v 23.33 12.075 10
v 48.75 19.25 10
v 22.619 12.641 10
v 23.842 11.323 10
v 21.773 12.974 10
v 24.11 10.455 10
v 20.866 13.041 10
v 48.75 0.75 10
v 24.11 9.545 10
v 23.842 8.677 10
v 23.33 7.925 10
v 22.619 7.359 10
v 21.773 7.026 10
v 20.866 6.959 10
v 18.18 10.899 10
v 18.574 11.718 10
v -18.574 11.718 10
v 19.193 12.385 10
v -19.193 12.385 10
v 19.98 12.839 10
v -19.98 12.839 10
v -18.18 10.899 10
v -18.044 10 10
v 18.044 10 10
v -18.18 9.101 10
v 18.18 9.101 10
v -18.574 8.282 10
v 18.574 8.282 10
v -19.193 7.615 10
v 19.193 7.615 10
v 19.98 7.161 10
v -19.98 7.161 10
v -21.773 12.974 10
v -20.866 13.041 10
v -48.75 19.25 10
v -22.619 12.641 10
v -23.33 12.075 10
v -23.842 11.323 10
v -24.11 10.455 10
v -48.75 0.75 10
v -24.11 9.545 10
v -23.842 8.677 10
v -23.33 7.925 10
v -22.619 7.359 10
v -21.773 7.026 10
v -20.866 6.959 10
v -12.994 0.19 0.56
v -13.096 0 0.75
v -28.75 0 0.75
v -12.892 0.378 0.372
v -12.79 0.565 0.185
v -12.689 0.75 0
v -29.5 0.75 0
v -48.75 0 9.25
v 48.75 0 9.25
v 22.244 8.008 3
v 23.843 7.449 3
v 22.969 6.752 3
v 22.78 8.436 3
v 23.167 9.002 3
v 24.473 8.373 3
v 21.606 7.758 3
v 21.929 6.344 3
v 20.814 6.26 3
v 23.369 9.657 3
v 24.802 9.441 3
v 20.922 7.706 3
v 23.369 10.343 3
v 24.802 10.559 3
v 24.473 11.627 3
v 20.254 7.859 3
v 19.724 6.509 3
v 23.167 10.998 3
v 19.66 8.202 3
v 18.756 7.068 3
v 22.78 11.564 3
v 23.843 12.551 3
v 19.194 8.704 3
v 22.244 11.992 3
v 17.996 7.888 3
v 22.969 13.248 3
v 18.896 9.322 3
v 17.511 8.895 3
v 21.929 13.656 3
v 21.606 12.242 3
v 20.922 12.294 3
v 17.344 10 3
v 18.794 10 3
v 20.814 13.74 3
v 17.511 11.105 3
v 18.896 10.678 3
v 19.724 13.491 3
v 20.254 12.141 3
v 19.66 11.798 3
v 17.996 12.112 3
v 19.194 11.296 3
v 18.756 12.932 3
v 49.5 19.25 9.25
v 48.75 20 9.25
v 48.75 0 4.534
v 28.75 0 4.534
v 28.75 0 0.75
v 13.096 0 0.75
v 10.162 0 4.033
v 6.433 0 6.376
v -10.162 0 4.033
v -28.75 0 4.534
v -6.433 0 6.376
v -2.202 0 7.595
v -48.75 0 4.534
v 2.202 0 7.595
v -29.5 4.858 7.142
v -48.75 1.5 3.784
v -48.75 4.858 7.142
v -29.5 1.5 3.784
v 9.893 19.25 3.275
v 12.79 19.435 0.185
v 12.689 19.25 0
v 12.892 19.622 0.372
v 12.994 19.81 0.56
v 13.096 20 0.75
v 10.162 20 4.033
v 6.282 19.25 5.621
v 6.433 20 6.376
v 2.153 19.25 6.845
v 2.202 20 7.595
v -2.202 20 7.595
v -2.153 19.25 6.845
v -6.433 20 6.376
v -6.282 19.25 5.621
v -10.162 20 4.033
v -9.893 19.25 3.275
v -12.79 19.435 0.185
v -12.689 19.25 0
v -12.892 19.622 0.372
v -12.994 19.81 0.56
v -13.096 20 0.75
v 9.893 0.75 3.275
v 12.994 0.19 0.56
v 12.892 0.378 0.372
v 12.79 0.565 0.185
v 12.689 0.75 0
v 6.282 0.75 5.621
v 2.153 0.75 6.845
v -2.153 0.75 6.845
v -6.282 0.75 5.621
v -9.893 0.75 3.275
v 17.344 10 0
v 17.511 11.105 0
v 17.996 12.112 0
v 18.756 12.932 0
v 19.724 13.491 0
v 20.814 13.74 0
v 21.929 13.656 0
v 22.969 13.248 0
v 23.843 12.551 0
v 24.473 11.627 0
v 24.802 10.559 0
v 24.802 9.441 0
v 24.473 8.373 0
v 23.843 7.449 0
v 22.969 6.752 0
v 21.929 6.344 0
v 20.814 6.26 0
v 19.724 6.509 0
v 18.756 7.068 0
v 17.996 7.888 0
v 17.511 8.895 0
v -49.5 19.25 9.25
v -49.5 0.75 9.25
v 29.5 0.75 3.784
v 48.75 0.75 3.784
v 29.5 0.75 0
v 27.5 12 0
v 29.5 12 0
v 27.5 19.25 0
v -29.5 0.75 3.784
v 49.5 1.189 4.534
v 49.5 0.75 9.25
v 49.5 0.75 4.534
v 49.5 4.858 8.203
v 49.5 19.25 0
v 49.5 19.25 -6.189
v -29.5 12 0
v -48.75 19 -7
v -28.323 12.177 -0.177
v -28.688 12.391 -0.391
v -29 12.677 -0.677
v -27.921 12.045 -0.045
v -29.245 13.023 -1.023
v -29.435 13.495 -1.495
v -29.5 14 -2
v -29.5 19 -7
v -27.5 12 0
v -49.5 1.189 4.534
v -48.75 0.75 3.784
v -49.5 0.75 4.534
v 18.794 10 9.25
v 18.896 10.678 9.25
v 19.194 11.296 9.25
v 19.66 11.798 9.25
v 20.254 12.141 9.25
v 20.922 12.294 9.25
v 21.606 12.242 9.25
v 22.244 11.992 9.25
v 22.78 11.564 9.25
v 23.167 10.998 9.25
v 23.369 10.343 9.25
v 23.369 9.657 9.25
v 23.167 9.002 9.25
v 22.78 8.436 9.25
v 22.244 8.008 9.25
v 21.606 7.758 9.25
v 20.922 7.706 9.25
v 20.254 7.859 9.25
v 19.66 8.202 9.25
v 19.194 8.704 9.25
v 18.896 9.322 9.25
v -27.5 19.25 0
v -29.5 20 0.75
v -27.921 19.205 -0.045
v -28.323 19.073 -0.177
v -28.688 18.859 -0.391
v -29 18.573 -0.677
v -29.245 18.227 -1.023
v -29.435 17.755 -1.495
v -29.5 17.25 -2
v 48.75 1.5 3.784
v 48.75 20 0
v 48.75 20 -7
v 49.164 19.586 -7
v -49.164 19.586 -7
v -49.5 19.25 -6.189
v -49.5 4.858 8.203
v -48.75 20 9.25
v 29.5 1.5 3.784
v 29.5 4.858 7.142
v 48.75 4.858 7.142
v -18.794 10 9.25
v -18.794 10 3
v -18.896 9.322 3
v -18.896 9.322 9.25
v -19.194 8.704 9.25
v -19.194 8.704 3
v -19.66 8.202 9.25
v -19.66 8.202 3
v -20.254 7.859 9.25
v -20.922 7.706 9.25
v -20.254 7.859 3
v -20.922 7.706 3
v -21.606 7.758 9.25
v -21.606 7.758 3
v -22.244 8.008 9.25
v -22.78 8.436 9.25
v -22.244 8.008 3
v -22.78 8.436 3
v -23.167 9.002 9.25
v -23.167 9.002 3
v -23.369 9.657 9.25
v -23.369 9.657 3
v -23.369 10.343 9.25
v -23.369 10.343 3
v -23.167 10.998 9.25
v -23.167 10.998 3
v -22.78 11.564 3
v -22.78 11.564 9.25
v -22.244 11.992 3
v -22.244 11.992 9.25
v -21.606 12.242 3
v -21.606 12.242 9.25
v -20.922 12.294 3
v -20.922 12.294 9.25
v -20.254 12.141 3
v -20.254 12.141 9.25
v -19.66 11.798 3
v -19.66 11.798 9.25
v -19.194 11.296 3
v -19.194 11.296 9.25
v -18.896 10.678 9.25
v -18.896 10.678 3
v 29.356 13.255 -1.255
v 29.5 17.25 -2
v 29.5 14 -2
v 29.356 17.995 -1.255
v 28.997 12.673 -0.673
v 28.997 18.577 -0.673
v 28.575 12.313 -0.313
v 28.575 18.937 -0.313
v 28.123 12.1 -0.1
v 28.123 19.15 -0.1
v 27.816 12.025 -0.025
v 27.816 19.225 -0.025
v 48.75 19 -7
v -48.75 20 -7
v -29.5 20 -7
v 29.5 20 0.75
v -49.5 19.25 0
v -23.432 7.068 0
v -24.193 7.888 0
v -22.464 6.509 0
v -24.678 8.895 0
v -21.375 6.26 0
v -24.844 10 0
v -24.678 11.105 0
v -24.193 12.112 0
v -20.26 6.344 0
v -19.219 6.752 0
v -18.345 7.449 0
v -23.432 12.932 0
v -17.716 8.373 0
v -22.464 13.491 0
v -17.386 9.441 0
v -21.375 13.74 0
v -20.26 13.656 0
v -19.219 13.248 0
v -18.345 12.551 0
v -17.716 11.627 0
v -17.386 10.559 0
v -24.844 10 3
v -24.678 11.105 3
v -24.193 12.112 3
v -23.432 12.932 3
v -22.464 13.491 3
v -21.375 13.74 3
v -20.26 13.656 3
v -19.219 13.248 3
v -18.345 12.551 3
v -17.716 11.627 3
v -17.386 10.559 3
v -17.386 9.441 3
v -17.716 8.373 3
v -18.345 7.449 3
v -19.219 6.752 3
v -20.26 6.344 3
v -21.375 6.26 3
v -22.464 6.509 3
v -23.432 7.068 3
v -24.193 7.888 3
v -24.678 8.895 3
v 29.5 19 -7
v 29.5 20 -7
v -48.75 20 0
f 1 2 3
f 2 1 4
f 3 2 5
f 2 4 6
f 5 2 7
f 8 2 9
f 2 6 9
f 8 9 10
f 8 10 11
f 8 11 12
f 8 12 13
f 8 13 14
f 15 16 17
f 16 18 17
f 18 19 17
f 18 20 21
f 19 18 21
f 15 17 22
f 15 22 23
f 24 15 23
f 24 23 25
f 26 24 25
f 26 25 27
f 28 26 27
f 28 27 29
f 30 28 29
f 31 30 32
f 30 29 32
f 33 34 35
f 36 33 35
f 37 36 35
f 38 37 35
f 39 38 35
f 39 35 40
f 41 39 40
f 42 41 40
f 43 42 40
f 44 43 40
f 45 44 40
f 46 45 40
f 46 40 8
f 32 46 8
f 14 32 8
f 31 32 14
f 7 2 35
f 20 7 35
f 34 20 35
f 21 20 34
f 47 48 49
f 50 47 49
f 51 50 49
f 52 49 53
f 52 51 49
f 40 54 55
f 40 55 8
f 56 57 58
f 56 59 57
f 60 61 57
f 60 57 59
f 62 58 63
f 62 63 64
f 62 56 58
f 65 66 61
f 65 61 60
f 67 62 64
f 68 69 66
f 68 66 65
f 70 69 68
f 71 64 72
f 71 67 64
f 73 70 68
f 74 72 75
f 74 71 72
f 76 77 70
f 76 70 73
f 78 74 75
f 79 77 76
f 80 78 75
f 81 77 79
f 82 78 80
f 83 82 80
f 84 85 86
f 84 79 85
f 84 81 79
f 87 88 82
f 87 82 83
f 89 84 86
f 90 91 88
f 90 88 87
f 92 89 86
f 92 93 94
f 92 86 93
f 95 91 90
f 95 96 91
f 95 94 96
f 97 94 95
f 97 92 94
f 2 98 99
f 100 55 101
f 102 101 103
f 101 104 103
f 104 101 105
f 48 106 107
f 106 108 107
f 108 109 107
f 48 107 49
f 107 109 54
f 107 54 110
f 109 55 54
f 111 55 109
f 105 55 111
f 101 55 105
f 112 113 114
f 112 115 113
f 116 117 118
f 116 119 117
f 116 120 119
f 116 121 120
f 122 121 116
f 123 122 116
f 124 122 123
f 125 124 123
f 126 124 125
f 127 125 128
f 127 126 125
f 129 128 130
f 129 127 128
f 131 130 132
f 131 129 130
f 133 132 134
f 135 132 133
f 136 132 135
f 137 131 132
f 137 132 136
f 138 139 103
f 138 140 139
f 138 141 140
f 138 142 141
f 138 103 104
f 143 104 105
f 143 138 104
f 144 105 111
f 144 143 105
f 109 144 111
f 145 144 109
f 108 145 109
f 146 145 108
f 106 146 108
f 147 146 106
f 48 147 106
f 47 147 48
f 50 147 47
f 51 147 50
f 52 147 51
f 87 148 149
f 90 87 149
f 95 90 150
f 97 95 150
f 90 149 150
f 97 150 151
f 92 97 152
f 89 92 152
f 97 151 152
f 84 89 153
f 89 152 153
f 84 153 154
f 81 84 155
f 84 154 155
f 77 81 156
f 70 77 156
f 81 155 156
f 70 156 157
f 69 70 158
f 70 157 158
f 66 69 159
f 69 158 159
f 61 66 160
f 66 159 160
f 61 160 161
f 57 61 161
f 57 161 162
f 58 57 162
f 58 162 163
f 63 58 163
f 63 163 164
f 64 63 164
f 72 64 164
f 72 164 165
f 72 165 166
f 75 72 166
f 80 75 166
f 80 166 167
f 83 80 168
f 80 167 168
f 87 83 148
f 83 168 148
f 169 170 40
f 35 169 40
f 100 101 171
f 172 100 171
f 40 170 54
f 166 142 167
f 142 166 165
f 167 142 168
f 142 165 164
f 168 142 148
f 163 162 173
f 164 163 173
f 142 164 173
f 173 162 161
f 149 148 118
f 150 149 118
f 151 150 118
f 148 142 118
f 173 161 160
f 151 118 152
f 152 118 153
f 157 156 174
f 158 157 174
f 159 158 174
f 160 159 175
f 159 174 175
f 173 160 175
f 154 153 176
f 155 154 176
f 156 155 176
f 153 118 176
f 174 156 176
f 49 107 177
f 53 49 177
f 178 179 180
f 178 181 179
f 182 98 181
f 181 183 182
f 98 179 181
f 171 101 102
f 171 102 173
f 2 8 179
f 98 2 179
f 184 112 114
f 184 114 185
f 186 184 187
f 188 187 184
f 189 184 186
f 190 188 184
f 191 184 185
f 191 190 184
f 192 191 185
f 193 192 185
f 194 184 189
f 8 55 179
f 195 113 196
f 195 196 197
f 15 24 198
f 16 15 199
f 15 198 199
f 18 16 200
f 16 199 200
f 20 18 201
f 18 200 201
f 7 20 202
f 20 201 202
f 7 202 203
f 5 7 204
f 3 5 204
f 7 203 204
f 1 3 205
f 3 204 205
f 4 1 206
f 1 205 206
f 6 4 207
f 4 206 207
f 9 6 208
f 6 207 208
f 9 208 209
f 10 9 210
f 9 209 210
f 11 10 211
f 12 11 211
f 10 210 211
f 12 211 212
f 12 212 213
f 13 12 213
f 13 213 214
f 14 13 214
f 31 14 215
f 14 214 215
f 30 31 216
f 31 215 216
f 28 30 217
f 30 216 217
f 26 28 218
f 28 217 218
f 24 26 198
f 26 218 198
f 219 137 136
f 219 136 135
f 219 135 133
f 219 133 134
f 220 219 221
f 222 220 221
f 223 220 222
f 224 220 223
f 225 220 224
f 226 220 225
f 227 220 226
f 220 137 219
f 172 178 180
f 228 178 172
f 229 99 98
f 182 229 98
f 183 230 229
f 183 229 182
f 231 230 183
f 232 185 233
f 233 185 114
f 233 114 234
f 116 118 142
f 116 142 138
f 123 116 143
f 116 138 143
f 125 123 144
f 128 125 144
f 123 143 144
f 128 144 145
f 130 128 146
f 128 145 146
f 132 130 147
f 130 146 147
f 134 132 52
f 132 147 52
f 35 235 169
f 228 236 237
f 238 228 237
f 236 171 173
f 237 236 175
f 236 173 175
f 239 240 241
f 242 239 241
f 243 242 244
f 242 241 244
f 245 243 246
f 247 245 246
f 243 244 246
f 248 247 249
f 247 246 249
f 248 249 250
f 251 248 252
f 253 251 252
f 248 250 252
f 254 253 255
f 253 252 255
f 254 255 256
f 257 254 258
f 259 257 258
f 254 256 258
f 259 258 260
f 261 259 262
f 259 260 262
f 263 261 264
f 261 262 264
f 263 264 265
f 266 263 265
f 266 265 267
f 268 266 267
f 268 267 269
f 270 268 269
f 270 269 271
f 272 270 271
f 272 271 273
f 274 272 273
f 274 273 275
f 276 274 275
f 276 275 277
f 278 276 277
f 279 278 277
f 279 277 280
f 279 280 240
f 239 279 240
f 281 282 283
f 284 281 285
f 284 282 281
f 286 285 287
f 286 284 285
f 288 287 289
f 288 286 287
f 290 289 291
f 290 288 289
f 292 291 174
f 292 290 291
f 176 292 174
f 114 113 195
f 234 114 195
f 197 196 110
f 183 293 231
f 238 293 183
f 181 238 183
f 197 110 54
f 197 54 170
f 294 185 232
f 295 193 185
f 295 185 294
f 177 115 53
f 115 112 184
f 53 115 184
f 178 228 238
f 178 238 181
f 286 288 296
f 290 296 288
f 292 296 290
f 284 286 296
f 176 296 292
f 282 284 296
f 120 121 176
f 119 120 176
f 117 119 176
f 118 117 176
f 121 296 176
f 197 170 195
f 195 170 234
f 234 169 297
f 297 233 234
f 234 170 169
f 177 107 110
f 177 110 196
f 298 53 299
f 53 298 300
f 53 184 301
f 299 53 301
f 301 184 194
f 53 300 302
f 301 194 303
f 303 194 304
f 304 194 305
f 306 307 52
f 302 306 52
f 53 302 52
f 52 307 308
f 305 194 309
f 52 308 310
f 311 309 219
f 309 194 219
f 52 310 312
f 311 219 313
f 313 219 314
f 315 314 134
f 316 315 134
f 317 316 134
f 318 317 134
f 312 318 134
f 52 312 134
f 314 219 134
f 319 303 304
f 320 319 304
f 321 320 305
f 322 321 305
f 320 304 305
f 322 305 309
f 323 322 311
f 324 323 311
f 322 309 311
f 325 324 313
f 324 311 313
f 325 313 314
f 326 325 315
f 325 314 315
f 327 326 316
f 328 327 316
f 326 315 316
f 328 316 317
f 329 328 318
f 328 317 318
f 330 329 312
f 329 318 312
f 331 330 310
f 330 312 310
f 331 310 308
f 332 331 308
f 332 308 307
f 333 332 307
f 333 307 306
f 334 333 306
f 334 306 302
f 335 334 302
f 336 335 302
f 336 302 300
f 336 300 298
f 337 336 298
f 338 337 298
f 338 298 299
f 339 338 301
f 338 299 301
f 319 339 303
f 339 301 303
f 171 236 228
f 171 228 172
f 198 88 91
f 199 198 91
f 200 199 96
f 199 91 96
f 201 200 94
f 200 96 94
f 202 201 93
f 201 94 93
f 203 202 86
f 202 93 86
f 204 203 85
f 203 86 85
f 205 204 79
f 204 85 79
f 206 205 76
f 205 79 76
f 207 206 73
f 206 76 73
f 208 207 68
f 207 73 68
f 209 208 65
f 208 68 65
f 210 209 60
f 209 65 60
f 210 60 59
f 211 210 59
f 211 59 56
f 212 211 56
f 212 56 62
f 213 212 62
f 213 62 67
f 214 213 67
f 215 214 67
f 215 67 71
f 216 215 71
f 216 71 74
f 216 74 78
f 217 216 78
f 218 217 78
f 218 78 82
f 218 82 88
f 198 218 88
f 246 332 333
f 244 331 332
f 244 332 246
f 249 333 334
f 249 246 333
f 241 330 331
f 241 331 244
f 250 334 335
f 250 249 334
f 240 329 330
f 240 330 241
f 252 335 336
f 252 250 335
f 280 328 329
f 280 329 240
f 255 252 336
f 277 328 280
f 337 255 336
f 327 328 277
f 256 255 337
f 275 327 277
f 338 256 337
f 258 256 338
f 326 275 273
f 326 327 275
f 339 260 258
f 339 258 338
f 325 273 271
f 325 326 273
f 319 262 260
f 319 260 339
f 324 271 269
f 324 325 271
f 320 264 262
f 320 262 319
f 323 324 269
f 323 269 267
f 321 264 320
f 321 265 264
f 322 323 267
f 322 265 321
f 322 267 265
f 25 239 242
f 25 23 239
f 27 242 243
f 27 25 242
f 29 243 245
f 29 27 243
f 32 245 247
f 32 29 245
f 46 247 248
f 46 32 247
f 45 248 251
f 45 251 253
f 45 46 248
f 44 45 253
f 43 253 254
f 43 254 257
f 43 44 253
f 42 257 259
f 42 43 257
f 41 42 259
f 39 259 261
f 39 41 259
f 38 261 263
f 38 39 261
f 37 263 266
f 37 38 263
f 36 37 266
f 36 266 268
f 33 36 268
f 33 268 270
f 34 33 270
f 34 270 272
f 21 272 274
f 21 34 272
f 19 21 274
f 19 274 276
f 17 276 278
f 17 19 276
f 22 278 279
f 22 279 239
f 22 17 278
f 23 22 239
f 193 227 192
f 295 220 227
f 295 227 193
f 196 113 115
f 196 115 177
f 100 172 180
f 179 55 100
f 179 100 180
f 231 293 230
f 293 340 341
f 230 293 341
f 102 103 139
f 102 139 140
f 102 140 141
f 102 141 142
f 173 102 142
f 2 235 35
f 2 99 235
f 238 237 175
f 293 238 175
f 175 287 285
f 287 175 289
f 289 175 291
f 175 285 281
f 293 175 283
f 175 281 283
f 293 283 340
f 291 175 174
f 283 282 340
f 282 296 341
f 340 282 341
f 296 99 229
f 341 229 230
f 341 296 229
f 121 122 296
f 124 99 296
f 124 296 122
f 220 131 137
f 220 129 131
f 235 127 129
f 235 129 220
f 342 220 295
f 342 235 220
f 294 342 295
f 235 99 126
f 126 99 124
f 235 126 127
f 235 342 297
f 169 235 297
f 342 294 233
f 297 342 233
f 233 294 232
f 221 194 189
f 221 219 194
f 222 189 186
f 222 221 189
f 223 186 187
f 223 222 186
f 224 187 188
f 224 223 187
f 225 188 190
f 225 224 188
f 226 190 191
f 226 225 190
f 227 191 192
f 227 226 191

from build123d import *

# Parameters (mm, degrees)
SKIZZE1_W                       = 59
SKIZZE1_H                       = 20
AUFSATZ_LINEAR_AUSTRAGEN1_DEPTH = 10
AUFSATZ_LINEAR_AUSTRAGEN2_DEPTH = 20
SKIZZE3_R                       = 15
SCHNITT_LINEAR_AUSTRAGEN1_DEPTH = 20
SKIZZE4_R                       = 2.3
SCHNITT_LINEAR_AUSTRAGEN2_DEPTH = 10
SKIZZE5_R                       = 3.75
SCHNITT_LINEAR_AUSTRAGEN3_DEPTH = 3
SCHNITT_LINEAR_AUSTRAGEN4_DEPTH = 20
VERRUNDUNG1_R                   = 2


with BuildPart() as part:
    # Skizze1 → Aufsatz-Linear austragen1 (new body)
    with BuildSketch(Plane.XY):
        with Locations((0, 10)):
            Rectangle(SKIZZE1_W, SKIZZE1_H)
    extrude(amount=AUFSATZ_LINEAR_AUSTRAGEN1_DEPTH)

    # Skizze2 → Aufsatz-Linear austragen2 (add)
    with BuildSketch(Plane.ZY.offset(29.5)):
        Polygon((7.142135624, 4.857864376), (-7, 19), (-7, 20), (0, 20), (10, 20), (10, 0), (2.284271247, 0), align=None)
    aufsatz_linear_austragen2 = extrude(amount=AUFSATZ_LINEAR_AUSTRAGEN2_DEPTH)

    # Spiegeln1: Aufsatz-Linear austragen2 across plane
    add(aufsatz_linear_austragen2.mirror(Plane(origin=(0, 0, 0), x_dir=(0, 0, 1), z_dir=(1, 0, 0))))

    # Skizze3 → Schnitt-Linear austragen1 (cut)
    with BuildSketch(Plane.XZ):
        with Locations((0, -8)):
            Circle(SKIZZE3_R)
    extrude(amount=-SCHNITT_LINEAR_AUSTRAGEN1_DEPTH, mode=Mode.SUBTRACT)

    # Skizze4 → Schnitt-Linear austragen2 (cut)
    with BuildSketch(Plane(origin=(0, 0, 0), x_dir=(-1, 0, 0), z_dir=(0, 0, -1))):
        with Locations((-21.09428877, 10)):
            Circle(SKIZZE4_R)
        with Locations(Location((21.09428877, 10, 0), (0, 0, 180))):
            Circle(SKIZZE4_R)
    extrude(amount=-SCHNITT_LINEAR_AUSTRAGEN2_DEPTH, mode=Mode.SUBTRACT)

    # Skizze5 → Schnitt-Linear austragen3 (cut)
    with BuildSketch(Plane(origin=(0, 0, 0), x_dir=(-1, 0, 0), z_dir=(0, 0, -1))):
        with Locations((-21.09428877, 10)):
            Circle(SKIZZE5_R)
        with Locations((21.09428877, 10)):
            Circle(SKIZZE5_R)
    extrude(amount=-SCHNITT_LINEAR_AUSTRAGEN3_DEPTH, mode=Mode.SUBTRACT)

    # Skizze6 → Schnitt-Linear austragen4 (cut)
    with BuildSketch(Plane(origin=(49.5, 0, 0), x_dir=(0, 0, -1), z_dir=(1, 0, 0))):
        Polygon((-3.784271247, 1.5), (-3.784271247, 0), (-1.831080062, -0.949282867), (-1.396270995, 1.527811212), align=None)
    schnitt_linear_austragen4 = extrude(amount=-SCHNITT_LINEAR_AUSTRAGEN4_DEPTH, mode=Mode.SUBTRACT)

    # Spiegeln2: Schnitt-Linear austragen4 across plane
    add(schnitt_linear_austragen4.mirror(Plane(origin=(0, 0, 0), x_dir=(0, 0, 1), z_dir=(1, 0, 0))), mode=Mode.SUBTRACT)

    # Fase1
    # the kernel refuses this chamfer: 0.75 mm, written as the material it takes off along each edge
    with BuildSketch(Plane(origin=(49, 19.5, 9.5), x_dir=(-0.7071067811865492, 0.7071067811865459, 0), z_dir=(0.5773502691896248, 0.5773502691896276, 0.5773502691896248)), Plane(origin=(-49, 19.5, 9.5), x_dir=(-0.7071067811865492, -0.7071067811865459, 0), z_dir=(-0.5773502691896248, 0.5773502691896276, 0.5773502691896248))) as fase1_piece_1:
        Polygon((-0.530330086, -0.306186218), (0.530330086, -0.306186218), (0, 0.612372436), align=None)
    extrude(amount=0.952627944, mode=Mode.SUBTRACT)
    with BuildSketch(Plane(origin=(49, 0.5, 4.284271247), x_dir=(-0.7071067811865476, -1.4654196281048569e-15, -0.7071067811865476), z_dir=(0.5773502691896273, -0.5773502691896242, -0.577350269189626)), Plane(origin=(-49, 0.5, 9.5), x_dir=(-0.7071067811865458, 0.7071067811865491, 0), z_dir=(-0.5773502691896266, -0.577350269189624, 0.5773502691896268)), Plane(origin=(-49, 0.5, 4.284271247), x_dir=(0, 0.7071067811865487, -0.7071067811865464), z_dir=(-0.577350269189627, -0.5773502691896243, -0.5773502691896261)), Plane(origin=(49, 0.5, 9.5), x_dir=(-0.7071067811865457, -0.7071067811865492, 0), z_dir=(0.5773502691896267, -0.5773502691896237, 0.5773502691896267))) as fase1_piece_2:
        Polygon((-0.530330086, 0.306186218), (0.530330086, 0.306186218), (0, -0.612372436), align=None)
    extrude(amount=0.952627944, mode=Mode.SUBTRACT)
    with BuildSketch(Plane(origin=(-21.09428877, 10, 10), x_dir=(1, 0, 0), z_dir=(0, 1, 0))) as fase1_piece_3:
        with BuildLine():
            Line((2.278786797, 0.771213203), (3.071213203, -0.021213203))
            Line((3.071213203, -0.021213203), (3.071213203, -0.036213203))
            ThreePointArc((3.071213203, -0.036213203), (2.685606602, -0.015), (2.3, -0.015))
            Line((2.3, -0.015), (2.285, 0))
            ThreePointArc((2.285, 0), (2.285, 0.385606602), (2.263786797, 0.771213203))
            Line((2.263786797, 0.771213203), (2.278786797, 0.771213203))
        make_face()
    revolve(axis=Axis((-21.09428877, 10, 10), (0, 0, -1)), mode=Mode.SUBTRACT)
    with BuildSketch(Plane(origin=(21.09428877, 10, 10), x_dir=(-1, 0, 0), z_dir=(0, -1, 0))) as fase1_piece_4:
        with BuildLine():
            Line((3.071213203, -0.021213203), (2.278786797, 0.771213203))
            Line((2.278786797, 0.771213203), (2.263786797, 0.771213203))
            ThreePointArc((2.263786797, 0.771213203), (2.285, 0.385606602), (2.285, 0))
            Line((2.285, 0), (2.3, -0.015))
            ThreePointArc((2.3, -0.015), (2.685606602, -0.015), (3.071213203, -0.036213203))
            Line((3.071213203, -0.036213203), (3.071213203, -0.021213203))
        make_face()
    revolve(axis=Axis((21.09428877, 10, 10), (0, 0, -1)), mode=Mode.SUBTRACT)
    with BuildSketch(Plane(origin=(49.5, 20, 0), x_dir=(-0.9996219169112969, 0.027495876610582292, 0), z_dir=(0, 0, 1))) as fase1_piece_5:
        with BuildLine():
            Line((0.771504896, 0), (-0.042410366, 0.770338345))
            Line((-0.042410366, 0.770338345), (-0.057404695, 0.769925907))
            ThreePointArc((-0.057404695, 0.769925907), (-0.02559692, 0.385048372), (-0.014994329, -0.000412438))
            Line((-0.014994329, -0.000412438), (0.000412438, -0.014994329))
            ThreePointArc((0.000412438, -0.014994329), (0.385873249, -0.004391737), (0.771917335, -0.014994329))
            Line((0.771917335, -0.014994329), (0.771504896, 0))
        make_face()
    extrude(amount=11.928762241, mode=Mode.SUBTRACT)
    with BuildSketch(Plane(origin=(49.5, 4.857864376, 7.142135624), x_dir=(-0.9996219169112968, -0.01944252080601377, -0.01944252080601398), z_dir=(0, 0.7071067811865513, -0.7071067811865438)), Plane(origin=(51.428762241, 0, 3.784271247), x_dir=(0, -0.027495876610586376, 0.9996219169112968), z_dir=(-1, 0, 0))) as fase1_piece_6:
        with BuildLine():
            Line((0.771504896, 0), (-0.042410366, 0.770338345))
            Line((-0.042410366, 0.770338345), (-0.057404695, 0.769925907))
            ThreePointArc((-0.057404695, 0.769925907), (-0.02559692, 0.385048372), (-0.014994329, -0.000412438))
            Line((-0.014994329, -0.000412438), (0.000412438, -0.014994329))
            ThreePointArc((0.000412438, -0.014994329), (0.385873249, -0.004391737), (0.771917335, -0.014994329))
            Line((0.771917335, -0.014994329), (0.771504896, 0))
        make_face()
    extrude(amount=21.928762241, mode=Mode.SUBTRACT)
    with BuildSketch(Plane(origin=(49.5, 0.13615914, 2.420430388), x_dir=(-0.9996219169112968, 0.01944252080601445, -0.019442520806014447), z_dir=(0, 0.7071067811865475, 0.7071067811865476))) as fase1_piece_7:
        with BuildLine():
            Line((0.771504896, 0), (-0.042410366, 0.770338345))
            Line((-0.042410366, 0.770338345), (-0.057404695, 0.769925907))
            ThreePointArc((-0.057404695, 0.769925907), (-0.02559692, 0.385048372), (-0.014994329, -0.000412438))
            Line((-0.014994329, -0.000412438), (0.000412438, -0.014994329))
            ThreePointArc((0.000412438, -0.014994329), (0.385873249, -0.004391737), (0.771917335, -0.014994329))
            Line((0.771917335, -0.014994329), (0.771504896, 0))
        make_face()
    extrude(amount=6.677499583, mode=Mode.SUBTRACT)
    with BuildSketch(Plane(origin=(49.5, 3.428762241, 3.784271247), x_dir=(0.027495876610582164, 0, 0.9996219169112969), z_dir=(0, -1, 0)), Plane(origin=(-49.5, 3.428762241, 3.784271247), x_dir=(0.9996219169112968, 0, -0.027495876610586317), z_dir=(0, -1, 0))) as fase1_piece_8:
        with BuildLine():
            Line((0.771504896, 0), (-0.042410366, 0.770338345))
            Line((-0.042410366, 0.770338345), (-0.057404695, 0.769925907))
            ThreePointArc((-0.057404695, 0.769925907), (-0.02559692, 0.385048372), (-0.014994329, -0.000412438))
            Line((-0.014994329, -0.000412438), (0.000412438, -0.014994329))
            ThreePointArc((0.000412438, -0.014994329), (0.385873249, -0.004391737), (0.771917335, -0.014994329))
            Line((0.771917335, -0.014994329), (0.771504896, 0))
        make_face()
    extrude(amount=5.357524482, mode=Mode.SUBTRACT)
    with BuildSketch(Plane(origin=(-49.5, 0, 11.928762241), x_dir=(0.9996219169112968, -0.027495876610586487, 0), z_dir=(0, 0, -1))) as fase1_piece_9:
        with BuildLine():
            Line((0.771504896, 0), (-0.042410366, -0.770338345))
            Line((-0.042410366, -0.770338345), (-0.057404695, -0.769925907))
            ThreePointArc((-0.057404695, -0.769925907), (-0.02559692, -0.385048372), (-0.014994329, 0.000412438))
            Line((-0.014994329, 0.000412438), (0.000412438, 0.014994329))
            ThreePointArc((0.000412438, 0.014994329), (0.385873249, 0.004391737), (0.771917335, 0.014994329))
            Line((0.771917335, 0.014994329), (0.771504896, 0))
        make_face()
    extrude(amount=10.073253234, mode=Mode.SUBTRACT)
    with BuildSketch(Plane(origin=(49.5, 21.928762241, 10), x_dir=(-0.9996219169112968, 0, 0.027495876610586893), z_dir=(0, -1, 0)), Plane(origin=(-49.5, 21.928762241, 10), x_dir=(-0.027495876610582164, 0, -0.9996219169112969), z_dir=(0, -1, 0))) as fase1_piece_10:
        with BuildLine():
            Line((0.771504896, 0), (-0.042410366, 0.770338345))
            Line((-0.042410366, 0.770338345), (-0.057404695, 0.769925907))
            ThreePointArc((-0.057404695, 0.769925907), (-0.02559692, 0.385048372), (-0.014994329, -0.000412438))
            Line((-0.014994329, -0.000412438), (0.000412438, -0.014994329))
            ThreePointArc((0.000412438, -0.014994329), (0.385873249, -0.004391737), (0.771917335, -0.014994329))
            Line((0.771917335, -0.014994329), (0.771504896, 0))
        make_face()
    extrude(amount=23.857524482, mode=Mode.SUBTRACT)
    with BuildSketch(Plane(origin=(51.428762241, 20, 10), x_dir=(0, 0.027495876610586768, -0.9996219169112968), z_dir=(-1, 0, 0))) as fase1_piece_11:
        with BuildLine():
            Line((0.771504896, 0), (-0.042410366, 0.770338345))
            Line((-0.042410366, 0.770338345), (-0.057404695, 0.769925907))
            ThreePointArc((-0.057404695, 0.769925907), (-0.02559692, 0.385048372), (-0.014994329, -0.000412438))
            Line((-0.014994329, -0.000412438), (0.000412438, -0.014994329))
            ThreePointArc((0.000412438, -0.014994329), (0.385873249, -0.004391737), (0.771917335, -0.014994329))
            Line((0.771917335, -0.014994329), (0.771504896, 0))
        make_face()
    extrude(amount=102.857524482, mode=Mode.SUBTRACT)
    with BuildSketch(Plane(origin=(51.428762241, 0, 10), x_dir=(0, -0.02749587661058636, -0.9996219169112968), z_dir=(-1, 0, 0))) as fase1_piece_12:
        with BuildLine():
            Line((0.771504896, 0), (-0.042410366, -0.770338345))
            Line((-0.042410366, -0.770338345), (-0.057404695, -0.769925907))
            ThreePointArc((-0.057404695, -0.769925907), (-0.02559692, -0.385048372), (-0.014994329, 0.000412438))
            Line((-0.014994329, 0.000412438), (0.000412438, 0.014994329))
            ThreePointArc((0.000412438, 0.014994329), (0.385873249, 0.004391737), (0.771917335, 0.014994329))
            Line((0.771917335, 0.014994329), (0.771504896, 0))
        make_face()
    extrude(amount=102.857524482, mode=Mode.SUBTRACT)
    with BuildSketch(Plane(origin=(49.5, 0, 11.928762241), x_dir=(-0.9996219169112968, -0.027495876610586487, 0), z_dir=(0, 0, -1))) as fase1_piece_13:
        with BuildLine():
            Line((0.771504896, 0), (-0.042410366, 0.770338345))
            Line((-0.042410366, 0.770338345), (-0.057404695, 0.769925907))
            ThreePointArc((-0.057404695, 0.769925907), (-0.02559692, 0.385048372), (-0.014994329, -0.000412438))
            Line((-0.014994329, -0.000412438), (0.000412438, -0.014994329))
            ThreePointArc((0.000412438, -0.014994329), (0.385873249, -0.004391737), (0.771917335, -0.014994329))
            Line((0.771917335, -0.014994329), (0.771504896, 0))
        make_face()
    extrude(amount=10.073253234, mode=Mode.SUBTRACT)
    with BuildSketch(Plane(origin=(29.5, 0, -1.928762241), x_dir=(-0.9996219169112968, -0.02749587661058636, 0), z_dir=(0, 0, 1)), Plane(origin=(-29.5, 0, 3.784271247), x_dir=(0.9996219169112965, -0.027495876610589942, 0), z_dir=(0, 0, -1))) as fase1_piece_14:
        with BuildLine():
            Line((0.771504896, 0), (-0.042410366, -0.770338345))
            Line((-0.042410366, -0.770338345), (-0.057404695, -0.769925907))
            ThreePointArc((-0.057404695, -0.769925907), (-0.02559692, -0.385048372), (-0.014994329, 0.000412438))
            Line((-0.014994329, 0.000412438), (0.000412438, 0.014994329))
            ThreePointArc((0.000412438, 0.014994329), (0.385873249, 0.004391737), (0.771917335, 0.014994329))
            Line((0.771917335, 0.014994329), (0.771504896, 0))
        make_face()
    extrude(amount=5.713033488, mode=Mode.SUBTRACT)
    with BuildSketch(Plane(origin=(31.428762241, 0, 0), x_dir=(0, -0.027495876610586372, 0.9996219169112968), z_dir=(-1, 0, 0)), Plane(origin=(-10.759815299, 0, 0), x_dir=(0, -0.027495876610586372, 0.9996219169112968), z_dir=(-1, 0, 0))) as fase1_piece_15:
        with BuildLine():
            Line((0.771504896, 0), (-0.042410366, 0.770338345))
            Line((-0.042410366, 0.770338345), (-0.057404695, 0.769925907))
            ThreePointArc((-0.057404695, 0.769925907), (-0.02559692, 0.385048372), (-0.014994329, -0.000412438))
            Line((-0.014994329, -0.000412438), (0.000412438, -0.014994329))
            ThreePointArc((0.000412438, -0.014994329), (0.385873249, -0.004391737), (0.771917335, -0.014994329))
            Line((0.771917335, -0.014994329), (0.771504896, 0))
        make_face()
    extrude(amount=20.668946941, mode=Mode.SUBTRACT)
    with BuildSketch(Plane(origin=(0, 0, -8), x_dir=(0.9073469377071578, 0, 0.42038260505573166), z_dir=(0.42038260505573166, 0, -0.9073469377071578))) as fase1_piece_16:
        with BuildLine():
            Line((15.771213203, 0.021213203), (14.978786797, -0.771213203))
            Line((14.978786797, -0.771213203), (14.963786797, -0.771213203))
            ThreePointArc((14.963786797, -0.771213203), (14.985, -0.385606602), (14.985, 0))
            Line((14.985, 0), (15, 0.015))
            ThreePointArc((15, 0.015), (15.385606602, 0.015), (15.771213203, 0.036213203))
            Line((15.771213203, 0.036213203), (15.771213203, 0.021213203))
        make_face()
    revolve(axis=Axis((0, 0, -8), (0, -1, 0)), revolution_arc=130.282509401, mode=Mode.SUBTRACT)
    with BuildSketch(Plane(origin=(-51.428762241, 0, 3.784271247), x_dir=(0, -0.027495876610586376, 0.9996219169112968), z_dir=(1, 0, 0)), Plane(origin=(-49.5, 4.857864376, 7.142135624), x_dir=(0.9996219169112968, -0.01944252080601377, -0.01944252080601398), z_dir=(0, 0.7071067811865513, -0.7071067811865438))) as fase1_piece_17:
        with BuildLine():
            Line((0.771504896, 0), (-0.042410366, -0.770338345))
            Line((-0.042410366, -0.770338345), (-0.057404695, -0.769925907))
            ThreePointArc((-0.057404695, -0.769925907), (-0.02559692, -0.385048372), (-0.014994329, 0.000412438))
            Line((-0.014994329, 0.000412438), (0.000412438, 0.014994329))
            ThreePointArc((0.000412438, 0.014994329), (0.385873249, 0.004391737), (0.771917335, 0.014994329))
            Line((0.771917335, 0.014994329), (0.771504896, 0))
        make_face()
    extrude(amount=21.928762241, mode=Mode.SUBTRACT)
    with BuildSketch(Plane(origin=(-49.5, 0.13615914, 2.420430388), x_dir=(0.9996219169112968, 0.01944252080601436, -0.019442520806014357), z_dir=(0, 0.7071067811865475, 0.7071067811865476))) as fase1_piece_18:
        with BuildLine():
            Line((0.771504896, 0), (-0.042410366, -0.770338345))
            Line((-0.042410366, -0.770338345), (-0.057404695, -0.769925907))
            ThreePointArc((-0.057404695, -0.769925907), (-0.02559692, -0.385048372), (-0.014994329, 0.000412438))
            Line((-0.014994329, 0.000412438), (0.000412438, 0.014994329))
            ThreePointArc((0.000412438, 0.014994329), (0.385873249, 0.004391737), (0.771917335, 0.014994329))
            Line((0.771917335, 0.014994329), (0.771504896, 0))
        make_face()
    extrude(amount=6.677499583, mode=Mode.SUBTRACT)
    with BuildSketch(Plane(origin=(-29.5, 20, 0), x_dir=(0, 0.027495876610586778, 0.9996219169112968), z_dir=(1, 0, 0)), Plane(origin=(10.759815299, 20, 0), x_dir=(0, 0.027495876610586778, 0.9996219169112968), z_dir=(1, 0, 0))) as fase1_piece_19:
        with BuildLine():
            Line((0.771504896, 0), (-0.042410366, 0.770338345))
            Line((-0.042410366, 0.770338345), (-0.057404695, 0.769925907))
            ThreePointArc((-0.057404695, 0.769925907), (-0.02559692, 0.385048372), (-0.014994329, -0.000412438))
            Line((-0.014994329, -0.000412438), (0.000412438, -0.014994329))
            ThreePointArc((0.000412438, -0.014994329), (0.385873249, -0.004391737), (0.771917335, -0.014994329))
            Line((0.771917335, -0.014994329), (0.771504896, 0))
        make_face()
    extrude(amount=18.740184701, mode=Mode.SUBTRACT)
    with BuildSketch(Plane(origin=(0, 20, -8), x_dir=(0.9073469377071578, 0, 0.42038260505573166), z_dir=(0.42038260505573166, 0, -0.9073469377071578))) as fase1_piece_20:
        with BuildLine():
            Line((14.978786797, 0.771213203), (15.771213203, -0.021213203))
            Line((15.771213203, -0.021213203), (15.771213203, -0.036213203))
            ThreePointArc((15.771213203, -0.036213203), (15.385606602, -0.015), (15, -0.015))
            Line((15, -0.015), (14.985, 0))
            ThreePointArc((14.985, 0), (14.985, 0.385606602), (14.963786797, 0.771213203))
            Line((14.963786797, 0.771213203), (14.978786797, 0.771213203))
        make_face()
    revolve(axis=Axis((0, 20, -8), (0, -1, 0)), revolution_arc=130.282509401, mode=Mode.SUBTRACT)
    with BuildSketch(Plane(origin=(-49.5, 20, 0), x_dir=(0.9996219169112969, 0.027495876610582292, 0), z_dir=(0, 0, 1))) as fase1_piece_21:
        with BuildLine():
            Line((0.771504896, 0), (-0.042410366, -0.770338345))
            Line((-0.042410366, -0.770338345), (-0.057404695, -0.769925907))
            ThreePointArc((-0.057404695, -0.769925907), (-0.02559692, -0.385048372), (-0.014994329, 0.000412438))
            Line((-0.014994329, 0.000412438), (0.000412438, 0.014994329))
            ThreePointArc((0.000412438, 0.014994329), (0.385873249, 0.004391737), (0.771917335, 0.014994329))
            Line((0.771917335, 0.014994329), (0.771504896, 0))
        make_face()
    extrude(amount=11.928762241, mode=Mode.SUBTRACT)
    with BuildSketch(Plane(origin=(-49.5, 20, -8.928762241), x_dir=(0.9996219169112968, 0.027495876610586893, -2.912407812628222e-14), z_dir=(0, 1.059216206806384e-12, 1.0))) as fase1_piece_22:
        with BuildLine():
            Line((0.771504896, 0), (-0.042410366, -0.770338345))
            Line((-0.042410366, -0.770338345), (-0.057404695, -0.769925907))
            ThreePointArc((-0.057404695, -0.769925907), (-0.02559692, -0.385048372), (-0.014994329, 0.000412438))
            Line((-0.014994329, 0.000412438), (0.000412438, 0.014994329))
            ThreePointArc((0.000412438, 0.014994329), (0.385873249, 0.004391737), (0.771917335, 0.014994329))
            Line((0.771917335, 0.014994329), (0.771504896, 0))
        make_face()
    extrude(amount=8.928762241, mode=Mode.SUBTRACT)
    with BuildSketch(Plane(origin=(49.5, 20, -8.928762241), x_dir=(-0.9996219169112968, 0.027495876610586893, -2.912407812628222e-14), z_dir=(0, 1.059216206806384e-12, 1.0))) as fase1_piece_23:
        with BuildLine():
            Line((0.771504896, 0), (-0.042410366, 0.770338345))
            Line((-0.042410366, 0.770338345), (-0.057404695, 0.769925907))
            ThreePointArc((-0.057404695, 0.769925907), (-0.02559692, 0.385048372), (-0.014994329, -0.000412438))
            Line((-0.014994329, -0.000412438), (0.000412438, -0.014994329))
            ThreePointArc((0.000412438, -0.014994329), (0.385873249, -0.004391737), (0.771917335, -0.014994329))
            Line((0.771917335, -0.014994329), (0.771504896, 0))
        make_face()
    extrude(amount=8.928762241, mode=Mode.SUBTRACT)
    with BuildSketch(Plane(origin=(49.5, 3.494023516, 8.505976484), x_dir=(-0.9996219169112968, -0.01944252080601521, -0.019442520806015415), z_dir=(0, 0.7071067811865513, -0.7071067811865438))) as fase1_piece_24a_section:
        with BuildLine():
            Line((0.771504896, 0), (-0.042410366, 0.770338345))
            Line((-0.042410366, 0.770338345), (-0.057404695, 0.769925907))
            ThreePointArc((-0.057404695, 0.769925907), (-0.02559692, 0.385048372), (-0.014994329, -0.000412438))
            Line((-0.014994329, -0.000412438), (0.000412438, -0.014994329))
            ThreePointArc((0.000412438, -0.014994329), (0.385873249, -0.004391737), (0.771917335, -0.014994329))
            Line((0.771917335, -0.014994329), (0.771504896, 0))
        make_face()
    fase1_piece_24a = extrude(amount=23.857524482, mode=Mode.PRIVATE)
    fase1_piece_24a = split(fase1_piece_24a, bisect_by=Plane(origin=(49.25265478, 5.032763859, 7.317035106), z_dir=(0, -0.7071067811865476, 0.7071067811865475)), keep=Keep.TOP, mode=Mode.PRIVATE)
    with BuildSketch(Plane(origin=(49.5, 0.13615914, 2.420430388), x_dir=(-0.9996219169112968, 0.01944252080601445, -0.019442520806014447), z_dir=(0, 0.7071067811865475, 0.7071067811865476))) as fase1_piece_24b_section:
        with BuildLine():
            Line((0.771504896, 0), (-0.042410366, 0.770338345))
            Line((-0.042410366, 0.770338345), (-0.057404695, 0.769925907))
            ThreePointArc((-0.057404695, 0.769925907), (-0.02559692, 0.385048372), (-0.014994329, -0.000412438))
            Line((-0.014994329, -0.000412438), (0.000412438, -0.014994329))
            ThreePointArc((0.000412438, -0.014994329), (0.385873249, -0.004391737), (0.771917335, -0.014994329))
            Line((0.771917335, -0.014994329), (0.771504896, 0))
        make_face()
    fase1_piece_24b = extrude(amount=8.606261823, mode=Mode.PRIVATE)
    fase1_piece_24b = split(fase1_piece_24b, bisect_by=Plane(origin=(49.25265478, 4.682964894, 7.317035106), z_dir=(0, 0.7071067811865438, 0.7071067811865513)), keep=Keep.TOP, mode=Mode.PRIVATE)
    fase1_piece_24 = fase1_piece_24a & fase1_piece_24b
    add(fase1_piece_24, mode=Mode.SUBTRACT)
    with BuildSketch(Plane(origin=(29.5, 0, -1.928762241), x_dir=(-0.9996219169112968, -0.02749587661058636, 0), z_dir=(0, 0, 1))) as fase1_piece_25a_section:
        with BuildLine():
            Line((0.771504896, 0), (-0.042410366, -0.770338345))
            Line((-0.042410366, -0.770338345), (-0.057404695, -0.769925907))
            ThreePointArc((-0.057404695, -0.769925907), (-0.02559692, -0.385048372), (-0.014994329, 0.000412438))
            Line((-0.014994329, 0.000412438), (0.000412438, 0.014994329))
            ThreePointArc((0.000412438, 0.014994329), (0.385873249, 0.004391737), (0.771917335, 0.014994329))
            Line((0.771917335, 0.014994329), (0.771504896, 0))
        make_face()
    fase1_piece_25a = extrude(amount=7.641795729, mode=Mode.PRIVATE)
    fase1_piece_25a = split(fase1_piece_25a, bisect_by=Plane(origin=(29.25265478, 0.24734522, 3.784271247), z_dir=(0, 0, 1)), keep=Keep.TOP, mode=Mode.PRIVATE)
    with BuildSketch(Plane(origin=(51.428762241, 0, 3.784271247), x_dir=(0, -0.027495876610586376, 0.9996219169112968), z_dir=(-1, 0, 0))) as fase1_piece_25b_section:
        with BuildLine():
            Line((0.771504896, 0), (-0.042410366, 0.770338345))
            Line((-0.042410366, 0.770338345), (-0.057404695, 0.769925907))
            ThreePointArc((-0.057404695, 0.769925907), (-0.02559692, 0.385048372), (-0.014994329, -0.000412438))
            Line((-0.014994329, -0.000412438), (0.000412438, -0.014994329))
            ThreePointArc((0.000412438, -0.014994329), (0.385873249, -0.004391737), (0.771917335, -0.014994329))
            Line((0.771917335, -0.014994329), (0.771504896, 0))
        make_face()
    fase1_piece_25b = extrude(amount=23.857524482, mode=Mode.PRIVATE)
    fase1_piece_25b = split(fase1_piece_25b, bisect_by=Plane(origin=(29.5, 0.24734522, 4.031616468), z_dir=(-1, 0, 0)), keep=Keep.TOP, mode=Mode.PRIVATE)
    fase1_piece_25 = fase1_piece_25a & fase1_piece_25b
    add(fase1_piece_25, mode=Mode.SUBTRACT)
    with BuildSketch(Plane(origin=(-51.428762241, 0, 3.784271247), x_dir=(0, -0.027495876610586376, 0.9996219169112968), z_dir=(1, 0, 0))) as fase1_piece_26a_section:
        with BuildLine():
            Line((0.771504896, 0), (-0.042410366, -0.770338345))
            Line((-0.042410366, -0.770338345), (-0.057404695, -0.769925907))
            ThreePointArc((-0.057404695, -0.769925907), (-0.02559692, -0.385048372), (-0.014994329, 0.000412438))
            Line((-0.014994329, 0.000412438), (0.000412438, 0.014994329))
            ThreePointArc((0.000412438, 0.014994329), (0.385873249, 0.004391737), (0.771917335, 0.014994329))
            Line((0.771917335, 0.014994329), (0.771504896, 0))
        make_face()
    fase1_piece_26a = extrude(amount=23.857524482, mode=Mode.PRIVATE)
    fase1_piece_26a = split(fase1_piece_26a, bisect_by=Plane(origin=(-29.5, 0.24734522, 4.031616468), z_dir=(1, 0, 0)), keep=Keep.TOP, mode=Mode.PRIVATE)
    with BuildSketch(Plane(origin=(-29.5, 0, 5.713033488), x_dir=(0.9996219169112968, -0.02749587661058636, 0), z_dir=(0, 0, -1))) as fase1_piece_26b_section:
        with BuildLine():
            Line((0.771504896, 0), (-0.042410366, -0.770338345))
            Line((-0.042410366, -0.770338345), (-0.057404695, -0.769925907))
            ThreePointArc((-0.057404695, -0.769925907), (-0.02559692, -0.385048372), (-0.014994329, 0.000412438))
            Line((-0.014994329, 0.000412438), (0.000412438, 0.014994329))
            ThreePointArc((0.000412438, 0.014994329), (0.385873249, 0.004391737), (0.771917335, 0.014994329))
            Line((0.771917335, 0.014994329), (0.771504896, 0))
        make_face()
    fase1_piece_26b = extrude(amount=7.641795729, mode=Mode.PRIVATE)
    fase1_piece_26b = split(fase1_piece_26b, bisect_by=Plane(origin=(-29.25265478, 0.24734522, 3.784271247), z_dir=(0, 0, 1)), keep=Keep.TOP, mode=Mode.PRIVATE)
    fase1_piece_26 = fase1_piece_26a & fase1_piece_26b
    add(fase1_piece_26, mode=Mode.SUBTRACT)
    with BuildSketch(Plane(origin=(-49.5, 3.494023516, 8.505976484), x_dir=(0.9996219169112968, -0.019442520806014923, -0.019442520806015127), z_dir=(0, 0.7071067811865513, -0.7071067811865438))) as fase1_piece_27a_section:
        with BuildLine():
            Line((0.771504896, 0), (-0.042410366, -0.770338345))
            Line((-0.042410366, -0.770338345), (-0.057404695, -0.769925907))
            ThreePointArc((-0.057404695, -0.769925907), (-0.02559692, -0.385048372), (-0.014994329, 0.000412438))
            Line((-0.014994329, 0.000412438), (0.000412438, 0.014994329))
            ThreePointArc((0.000412438, 0.014994329), (0.385873249, 0.004391737), (0.771917335, 0.014994329))
            Line((0.771917335, 0.014994329), (0.771504896, 0))
        make_face()
    fase1_piece_27a = extrude(amount=23.857524482, mode=Mode.PRIVATE)
    fase1_piece_27a = split(fase1_piece_27a, bisect_by=Plane(origin=(-49.25265478, 5.032763859, 7.317035106), z_dir=(0, -0.7071067811865476, 0.7071067811865475)), keep=Keep.TOP, mode=Mode.PRIVATE)
    with BuildSketch(Plane(origin=(-49.5, 0.13615914, 2.420430388), x_dir=(0.9996219169112968, 0.01944252080601436, -0.019442520806014357), z_dir=(0, 0.7071067811865475, 0.7071067811865476))) as fase1_piece_27b_section:
        with BuildLine():
            Line((0.771504896, 0), (-0.042410366, -0.770338345))
            Line((-0.042410366, -0.770338345), (-0.057404695, -0.769925907))
            ThreePointArc((-0.057404695, -0.769925907), (-0.02559692, -0.385048372), (-0.014994329, 0.000412438))
            Line((-0.014994329, 0.000412438), (0.000412438, 0.014994329))
            ThreePointArc((0.000412438, 0.014994329), (0.385873249, 0.004391737), (0.771917335, 0.014994329))
            Line((0.771917335, 0.014994329), (0.771504896, 0))
        make_face()
    fase1_piece_27b = extrude(amount=8.606261823, mode=Mode.PRIVATE)
    fase1_piece_27b = split(fase1_piece_27b, bisect_by=Plane(origin=(-49.25265478, 4.682964894, 7.317035106), z_dir=(0, 0.7071067811865438, 0.7071067811865513)), keep=Keep.TOP, mode=Mode.PRIVATE)
    fase1_piece_27 = fase1_piece_27a & fase1_piece_27b
    add(fase1_piece_27, mode=Mode.SUBTRACT)

    # Verrundung1
    verrundung1_edges = [part.edges().sort_by_distance(p)[0] for p in [
        (-29.5, 15.625, 0),
        (29.5, 15.625, 0),
    ]]
    fillet(verrundung1_edges, radius=VERRUNDUNG1_R)


solid = part.part
